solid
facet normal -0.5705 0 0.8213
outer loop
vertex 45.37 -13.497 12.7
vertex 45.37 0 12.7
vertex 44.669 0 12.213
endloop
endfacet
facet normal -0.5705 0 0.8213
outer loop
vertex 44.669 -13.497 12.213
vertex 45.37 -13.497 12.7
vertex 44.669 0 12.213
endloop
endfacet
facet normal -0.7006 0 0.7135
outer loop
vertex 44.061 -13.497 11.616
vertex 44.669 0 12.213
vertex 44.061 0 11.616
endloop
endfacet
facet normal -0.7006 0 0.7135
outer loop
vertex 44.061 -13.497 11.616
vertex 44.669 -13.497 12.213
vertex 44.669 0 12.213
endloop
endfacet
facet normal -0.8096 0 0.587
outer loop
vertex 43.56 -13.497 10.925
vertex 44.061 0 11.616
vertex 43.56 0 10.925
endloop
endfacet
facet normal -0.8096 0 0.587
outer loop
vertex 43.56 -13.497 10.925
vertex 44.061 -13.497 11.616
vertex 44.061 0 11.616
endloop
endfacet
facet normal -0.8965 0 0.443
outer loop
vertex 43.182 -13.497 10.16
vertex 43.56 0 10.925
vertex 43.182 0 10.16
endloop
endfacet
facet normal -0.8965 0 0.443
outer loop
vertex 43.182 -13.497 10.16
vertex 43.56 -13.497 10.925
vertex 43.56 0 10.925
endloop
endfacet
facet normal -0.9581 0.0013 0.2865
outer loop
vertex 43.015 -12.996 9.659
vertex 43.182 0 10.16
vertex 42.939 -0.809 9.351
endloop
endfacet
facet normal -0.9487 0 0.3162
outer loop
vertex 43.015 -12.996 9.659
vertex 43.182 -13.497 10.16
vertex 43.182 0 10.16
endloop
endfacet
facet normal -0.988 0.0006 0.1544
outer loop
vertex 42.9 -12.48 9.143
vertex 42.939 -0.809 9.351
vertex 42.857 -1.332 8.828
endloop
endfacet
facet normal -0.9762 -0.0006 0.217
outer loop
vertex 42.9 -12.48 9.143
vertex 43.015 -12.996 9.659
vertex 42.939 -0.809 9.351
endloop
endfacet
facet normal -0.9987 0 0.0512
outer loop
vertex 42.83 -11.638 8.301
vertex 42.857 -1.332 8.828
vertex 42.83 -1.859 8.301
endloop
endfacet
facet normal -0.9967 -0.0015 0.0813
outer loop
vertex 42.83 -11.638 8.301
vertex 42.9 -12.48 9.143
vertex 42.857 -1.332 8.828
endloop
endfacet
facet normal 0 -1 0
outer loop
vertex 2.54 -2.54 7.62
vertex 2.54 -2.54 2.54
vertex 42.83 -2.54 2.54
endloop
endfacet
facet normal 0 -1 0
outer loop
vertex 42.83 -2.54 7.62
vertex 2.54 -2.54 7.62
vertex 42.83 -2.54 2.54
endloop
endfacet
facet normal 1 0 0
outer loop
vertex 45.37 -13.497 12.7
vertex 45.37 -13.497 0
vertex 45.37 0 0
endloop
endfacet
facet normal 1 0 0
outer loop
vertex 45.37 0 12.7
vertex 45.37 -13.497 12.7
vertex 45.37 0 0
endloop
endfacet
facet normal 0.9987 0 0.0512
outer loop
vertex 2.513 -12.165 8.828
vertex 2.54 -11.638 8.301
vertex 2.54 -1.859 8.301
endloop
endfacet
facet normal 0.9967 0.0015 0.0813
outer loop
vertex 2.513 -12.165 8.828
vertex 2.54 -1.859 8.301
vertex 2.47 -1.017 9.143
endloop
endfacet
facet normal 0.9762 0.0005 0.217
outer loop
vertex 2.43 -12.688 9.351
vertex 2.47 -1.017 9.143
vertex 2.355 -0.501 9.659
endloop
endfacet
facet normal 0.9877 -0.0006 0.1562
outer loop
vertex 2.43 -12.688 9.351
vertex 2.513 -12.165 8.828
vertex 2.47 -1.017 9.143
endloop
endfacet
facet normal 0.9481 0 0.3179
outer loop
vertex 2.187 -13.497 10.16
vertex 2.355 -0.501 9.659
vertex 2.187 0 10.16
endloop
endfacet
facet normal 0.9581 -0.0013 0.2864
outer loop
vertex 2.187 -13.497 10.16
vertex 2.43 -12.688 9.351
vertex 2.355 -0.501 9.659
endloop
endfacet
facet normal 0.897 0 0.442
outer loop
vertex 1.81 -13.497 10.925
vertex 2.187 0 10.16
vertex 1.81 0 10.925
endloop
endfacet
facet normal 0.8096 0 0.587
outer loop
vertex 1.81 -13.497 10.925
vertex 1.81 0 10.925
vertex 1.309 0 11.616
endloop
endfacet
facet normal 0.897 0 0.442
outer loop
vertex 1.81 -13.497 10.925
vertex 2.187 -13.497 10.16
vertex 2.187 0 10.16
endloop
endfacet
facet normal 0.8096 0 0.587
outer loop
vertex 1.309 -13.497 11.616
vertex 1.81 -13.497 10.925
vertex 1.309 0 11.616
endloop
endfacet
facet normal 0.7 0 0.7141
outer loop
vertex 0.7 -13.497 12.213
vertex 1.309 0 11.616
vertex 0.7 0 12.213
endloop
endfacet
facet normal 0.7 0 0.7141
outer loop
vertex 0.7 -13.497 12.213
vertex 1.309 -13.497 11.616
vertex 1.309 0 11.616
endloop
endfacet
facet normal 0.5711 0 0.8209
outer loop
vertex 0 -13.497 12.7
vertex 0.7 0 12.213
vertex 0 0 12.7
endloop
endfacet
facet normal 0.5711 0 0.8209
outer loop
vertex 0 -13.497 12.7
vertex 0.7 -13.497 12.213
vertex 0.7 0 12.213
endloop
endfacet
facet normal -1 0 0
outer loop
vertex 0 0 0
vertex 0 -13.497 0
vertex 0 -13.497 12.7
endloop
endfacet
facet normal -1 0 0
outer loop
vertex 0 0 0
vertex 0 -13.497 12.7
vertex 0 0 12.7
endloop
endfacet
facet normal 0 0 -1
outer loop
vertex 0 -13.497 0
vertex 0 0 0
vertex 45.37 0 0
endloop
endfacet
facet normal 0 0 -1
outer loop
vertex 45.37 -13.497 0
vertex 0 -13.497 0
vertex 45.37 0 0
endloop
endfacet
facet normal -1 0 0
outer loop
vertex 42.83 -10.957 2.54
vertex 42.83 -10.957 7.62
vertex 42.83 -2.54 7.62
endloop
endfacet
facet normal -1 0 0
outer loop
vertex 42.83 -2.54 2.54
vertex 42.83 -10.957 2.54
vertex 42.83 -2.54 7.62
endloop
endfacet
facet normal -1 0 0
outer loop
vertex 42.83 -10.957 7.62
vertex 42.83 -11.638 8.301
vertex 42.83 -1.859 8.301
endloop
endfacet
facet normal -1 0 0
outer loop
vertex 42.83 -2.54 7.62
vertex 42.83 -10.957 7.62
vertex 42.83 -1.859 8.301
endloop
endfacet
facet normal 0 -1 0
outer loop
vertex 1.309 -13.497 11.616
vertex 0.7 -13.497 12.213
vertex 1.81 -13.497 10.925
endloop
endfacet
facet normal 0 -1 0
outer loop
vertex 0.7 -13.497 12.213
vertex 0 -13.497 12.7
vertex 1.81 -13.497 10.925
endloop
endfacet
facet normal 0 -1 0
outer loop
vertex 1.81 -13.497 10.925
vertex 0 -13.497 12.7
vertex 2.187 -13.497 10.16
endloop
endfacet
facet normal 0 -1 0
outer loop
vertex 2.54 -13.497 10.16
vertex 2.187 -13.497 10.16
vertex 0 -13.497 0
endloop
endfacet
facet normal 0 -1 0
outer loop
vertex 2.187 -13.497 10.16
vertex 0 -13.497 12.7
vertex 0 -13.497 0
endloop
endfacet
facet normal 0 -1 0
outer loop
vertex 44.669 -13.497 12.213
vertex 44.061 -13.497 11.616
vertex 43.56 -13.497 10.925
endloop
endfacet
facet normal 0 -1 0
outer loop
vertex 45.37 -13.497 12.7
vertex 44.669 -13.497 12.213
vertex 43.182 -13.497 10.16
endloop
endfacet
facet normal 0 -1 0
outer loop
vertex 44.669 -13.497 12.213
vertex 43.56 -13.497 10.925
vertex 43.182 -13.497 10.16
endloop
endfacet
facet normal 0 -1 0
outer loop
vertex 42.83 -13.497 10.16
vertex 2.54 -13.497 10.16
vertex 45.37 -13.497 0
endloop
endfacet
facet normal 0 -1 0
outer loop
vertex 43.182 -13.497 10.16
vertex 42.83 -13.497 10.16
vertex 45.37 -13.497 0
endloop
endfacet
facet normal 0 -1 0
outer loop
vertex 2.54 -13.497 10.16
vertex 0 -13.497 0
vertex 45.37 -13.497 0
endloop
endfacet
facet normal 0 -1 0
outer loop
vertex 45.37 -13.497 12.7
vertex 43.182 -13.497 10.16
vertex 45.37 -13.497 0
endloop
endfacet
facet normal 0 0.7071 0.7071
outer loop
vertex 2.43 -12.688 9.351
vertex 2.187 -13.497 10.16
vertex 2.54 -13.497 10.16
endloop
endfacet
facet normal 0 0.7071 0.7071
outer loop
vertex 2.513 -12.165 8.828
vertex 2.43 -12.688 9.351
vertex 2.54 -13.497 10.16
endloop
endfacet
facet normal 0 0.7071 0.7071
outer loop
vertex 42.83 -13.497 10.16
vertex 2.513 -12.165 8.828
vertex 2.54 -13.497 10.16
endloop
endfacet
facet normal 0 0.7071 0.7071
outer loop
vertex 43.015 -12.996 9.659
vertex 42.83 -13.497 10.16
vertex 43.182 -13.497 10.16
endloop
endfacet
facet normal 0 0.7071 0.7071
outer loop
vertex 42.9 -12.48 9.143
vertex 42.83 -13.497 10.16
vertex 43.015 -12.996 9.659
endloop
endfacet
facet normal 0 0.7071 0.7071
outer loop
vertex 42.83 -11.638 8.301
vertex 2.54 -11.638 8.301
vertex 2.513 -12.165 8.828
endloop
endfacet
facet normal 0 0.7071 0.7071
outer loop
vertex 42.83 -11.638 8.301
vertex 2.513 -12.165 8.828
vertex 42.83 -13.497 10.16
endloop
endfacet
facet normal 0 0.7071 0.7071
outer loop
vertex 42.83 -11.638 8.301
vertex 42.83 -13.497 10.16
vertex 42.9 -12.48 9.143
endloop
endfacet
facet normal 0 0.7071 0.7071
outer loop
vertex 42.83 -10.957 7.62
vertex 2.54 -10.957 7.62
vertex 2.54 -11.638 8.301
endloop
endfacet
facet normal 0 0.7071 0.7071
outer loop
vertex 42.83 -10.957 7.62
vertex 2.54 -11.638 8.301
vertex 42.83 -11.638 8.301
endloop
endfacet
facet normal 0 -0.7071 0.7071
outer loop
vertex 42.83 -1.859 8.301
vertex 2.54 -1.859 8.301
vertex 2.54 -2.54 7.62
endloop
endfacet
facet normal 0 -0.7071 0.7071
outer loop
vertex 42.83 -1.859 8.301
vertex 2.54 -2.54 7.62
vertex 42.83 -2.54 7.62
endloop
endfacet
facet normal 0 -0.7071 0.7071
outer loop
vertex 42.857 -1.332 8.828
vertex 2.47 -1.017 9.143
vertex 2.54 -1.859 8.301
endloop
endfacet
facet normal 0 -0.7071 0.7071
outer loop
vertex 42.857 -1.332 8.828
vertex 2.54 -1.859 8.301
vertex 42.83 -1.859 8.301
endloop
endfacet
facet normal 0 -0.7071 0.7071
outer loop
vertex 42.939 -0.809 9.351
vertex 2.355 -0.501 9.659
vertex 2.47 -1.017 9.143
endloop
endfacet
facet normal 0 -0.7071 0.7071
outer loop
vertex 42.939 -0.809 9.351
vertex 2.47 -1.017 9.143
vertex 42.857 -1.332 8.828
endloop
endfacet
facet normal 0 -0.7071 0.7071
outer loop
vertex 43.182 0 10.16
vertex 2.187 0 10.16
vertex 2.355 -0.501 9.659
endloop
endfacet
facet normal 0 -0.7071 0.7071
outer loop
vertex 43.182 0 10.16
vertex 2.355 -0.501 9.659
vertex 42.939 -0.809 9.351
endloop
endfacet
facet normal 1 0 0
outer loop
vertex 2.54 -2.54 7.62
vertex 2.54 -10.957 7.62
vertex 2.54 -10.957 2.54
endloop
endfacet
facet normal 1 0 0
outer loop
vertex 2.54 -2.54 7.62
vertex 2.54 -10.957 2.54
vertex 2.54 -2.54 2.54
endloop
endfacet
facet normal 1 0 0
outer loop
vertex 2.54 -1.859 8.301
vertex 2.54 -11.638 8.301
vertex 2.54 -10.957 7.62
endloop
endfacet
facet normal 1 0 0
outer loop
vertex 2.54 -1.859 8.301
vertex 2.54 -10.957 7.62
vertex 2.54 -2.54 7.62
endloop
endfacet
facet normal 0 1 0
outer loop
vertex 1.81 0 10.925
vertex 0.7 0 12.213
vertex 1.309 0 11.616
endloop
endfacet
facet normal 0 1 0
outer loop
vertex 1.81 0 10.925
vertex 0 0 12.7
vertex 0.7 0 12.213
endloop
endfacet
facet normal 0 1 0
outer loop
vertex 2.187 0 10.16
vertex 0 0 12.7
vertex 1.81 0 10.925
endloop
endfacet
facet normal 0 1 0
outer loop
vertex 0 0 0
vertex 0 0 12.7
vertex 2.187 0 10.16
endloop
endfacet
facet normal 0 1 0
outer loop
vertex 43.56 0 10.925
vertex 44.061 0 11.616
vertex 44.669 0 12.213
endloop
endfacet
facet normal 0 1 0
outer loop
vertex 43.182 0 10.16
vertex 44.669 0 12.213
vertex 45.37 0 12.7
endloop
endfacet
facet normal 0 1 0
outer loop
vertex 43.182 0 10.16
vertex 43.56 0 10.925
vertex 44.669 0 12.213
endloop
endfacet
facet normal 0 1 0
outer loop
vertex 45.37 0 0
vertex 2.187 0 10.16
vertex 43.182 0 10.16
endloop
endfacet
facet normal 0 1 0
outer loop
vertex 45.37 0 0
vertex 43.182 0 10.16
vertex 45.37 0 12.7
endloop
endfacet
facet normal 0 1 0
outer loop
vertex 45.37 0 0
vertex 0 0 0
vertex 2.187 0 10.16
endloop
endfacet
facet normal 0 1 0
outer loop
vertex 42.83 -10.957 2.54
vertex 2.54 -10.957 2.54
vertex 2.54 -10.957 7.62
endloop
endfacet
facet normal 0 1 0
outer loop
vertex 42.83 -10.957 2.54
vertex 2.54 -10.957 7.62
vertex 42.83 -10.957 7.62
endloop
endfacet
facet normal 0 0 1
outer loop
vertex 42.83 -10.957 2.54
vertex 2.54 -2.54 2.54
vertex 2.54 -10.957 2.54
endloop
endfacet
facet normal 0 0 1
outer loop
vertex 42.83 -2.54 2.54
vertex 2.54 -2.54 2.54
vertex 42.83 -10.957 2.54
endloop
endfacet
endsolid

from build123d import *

# Parameters (mm, degrees)
F0_W         = 45.3698039055
F0_H         = 13.4970545769
F1_DEPTH     = 12.7
F2_T         = -2.54
F3_T1_DEPTH  = 40.2898039055
F4_T4_DEPTH  = 35.494099833
F4_T10_DEPTH = 35.494099833


# Not quite as in the source:
# - a fillet or chamfer that OpenCascade refuses, or shapes differently, is made with other operations: its cross-section is extruded or revolved along the edge and cut away or added


with BuildPart() as f1:
    # F0 (on Top) → F1 (new body)
    with BuildSketch(Plane.XY):
        with Locations((22.6849019527, -6.7485272884)):
            Rectangle(F0_W, F0_H)
    extrude(amount=F1_DEPTH)

    # F2
    f2_openings = [f1.faces().sort_by_distance(p)[0] for p in [
        (22.684902, -6.748527, 12.7),
    ]]
    offset(amount=F2_T, openings=f2_openings)

    # F3: chamfer of 5.08 on 2 edges, made by hand

    # F3_s2 → F3_t1 (cut)
    with BuildSketch(Plane.YZ.offset(2.54)):
        Polygon((-16.0370545769, 12.7), (-10.9570545769, 7.62), (-10.9570545769, 12.7), align=None)
        Polygon((2.54, 12.7), (-2.54, 7.62), (-2.54, 12.7), align=None)
    extrude(amount=F3_T1_DEPTH, mode=Mode.SUBTRACT)

    # F4: fillet of radius 5.08 on 2 edges, made by hand


with BuildPart() as f4_tool2:
    # F4_s3 → F4_t4 (new body)
    with BuildSketch(Plane.XZ.offset(24.4955772049)):
        with BuildLine():
            ThreePointArc((45.3698039055, 12.7), (43.5103948543, 10.8405909488), (42.8298039055, 8.3005909488))
            Line((42.8298039055, 8.3005909488), (42.8298039055, 12.7))
            Line((42.8298039055, 12.7), (45.3698039055, 12.7))
        make_face()
    extrude(amount=-F4_T4_DEPTH)

    split(bisect_by=Plane(origin=(0, -1.6685272884, -1.6685272884), x_dir=(1, 0, 0), z_dir=(0, 0.7071067812, 0.7071067812)), keep=Keep.TOP)

    split(bisect_by=Plane(origin=(0, -5.08, 5.08), x_dir=(1, 0, 0), z_dir=(0, -0.7071067812, 0.7071067812)), keep=Keep.TOP)


with BuildPart() as f1_1:
    add(f1.part)

    # F4_t1: cut F4_tool2
    add(f4_tool2.part, mode=Mode.SUBTRACT)


with BuildPart() as f4_tool8:
    # F4_s9 → F4_t10 (new body)
    with BuildSketch(Plane.XZ.offset(24.4955772049)):
        with BuildLine():
            ThreePointArc((2.54, 8.3005909488), (1.8594090512, 10.8405909488), (0, 12.7))
            Line((0, 12.7), (2.54, 12.7))
            Line((2.54, 12.7), (2.54, 8.3005909488))
        make_face()
    extrude(amount=-F4_T10_DEPTH)

    split(bisect_by=Plane(origin=(0, -1.6685272884, -1.6685272884), x_dir=(1, 0, 0), z_dir=(0, 0.7071067812, 0.7071067812)), keep=Keep.TOP)

    split(bisect_by=Plane(origin=(0, -5.08, 5.08), x_dir=(1, 0, 0), z_dir=(0, -0.7071067812, 0.7071067812)), keep=Keep.TOP)


with BuildPart() as f1_2:
    add(f1_1.part)

    # F4_t7: cut F4_tool8
    add(f4_tool8.part, mode=Mode.SUBTRACT)


solid = f1_2.part
